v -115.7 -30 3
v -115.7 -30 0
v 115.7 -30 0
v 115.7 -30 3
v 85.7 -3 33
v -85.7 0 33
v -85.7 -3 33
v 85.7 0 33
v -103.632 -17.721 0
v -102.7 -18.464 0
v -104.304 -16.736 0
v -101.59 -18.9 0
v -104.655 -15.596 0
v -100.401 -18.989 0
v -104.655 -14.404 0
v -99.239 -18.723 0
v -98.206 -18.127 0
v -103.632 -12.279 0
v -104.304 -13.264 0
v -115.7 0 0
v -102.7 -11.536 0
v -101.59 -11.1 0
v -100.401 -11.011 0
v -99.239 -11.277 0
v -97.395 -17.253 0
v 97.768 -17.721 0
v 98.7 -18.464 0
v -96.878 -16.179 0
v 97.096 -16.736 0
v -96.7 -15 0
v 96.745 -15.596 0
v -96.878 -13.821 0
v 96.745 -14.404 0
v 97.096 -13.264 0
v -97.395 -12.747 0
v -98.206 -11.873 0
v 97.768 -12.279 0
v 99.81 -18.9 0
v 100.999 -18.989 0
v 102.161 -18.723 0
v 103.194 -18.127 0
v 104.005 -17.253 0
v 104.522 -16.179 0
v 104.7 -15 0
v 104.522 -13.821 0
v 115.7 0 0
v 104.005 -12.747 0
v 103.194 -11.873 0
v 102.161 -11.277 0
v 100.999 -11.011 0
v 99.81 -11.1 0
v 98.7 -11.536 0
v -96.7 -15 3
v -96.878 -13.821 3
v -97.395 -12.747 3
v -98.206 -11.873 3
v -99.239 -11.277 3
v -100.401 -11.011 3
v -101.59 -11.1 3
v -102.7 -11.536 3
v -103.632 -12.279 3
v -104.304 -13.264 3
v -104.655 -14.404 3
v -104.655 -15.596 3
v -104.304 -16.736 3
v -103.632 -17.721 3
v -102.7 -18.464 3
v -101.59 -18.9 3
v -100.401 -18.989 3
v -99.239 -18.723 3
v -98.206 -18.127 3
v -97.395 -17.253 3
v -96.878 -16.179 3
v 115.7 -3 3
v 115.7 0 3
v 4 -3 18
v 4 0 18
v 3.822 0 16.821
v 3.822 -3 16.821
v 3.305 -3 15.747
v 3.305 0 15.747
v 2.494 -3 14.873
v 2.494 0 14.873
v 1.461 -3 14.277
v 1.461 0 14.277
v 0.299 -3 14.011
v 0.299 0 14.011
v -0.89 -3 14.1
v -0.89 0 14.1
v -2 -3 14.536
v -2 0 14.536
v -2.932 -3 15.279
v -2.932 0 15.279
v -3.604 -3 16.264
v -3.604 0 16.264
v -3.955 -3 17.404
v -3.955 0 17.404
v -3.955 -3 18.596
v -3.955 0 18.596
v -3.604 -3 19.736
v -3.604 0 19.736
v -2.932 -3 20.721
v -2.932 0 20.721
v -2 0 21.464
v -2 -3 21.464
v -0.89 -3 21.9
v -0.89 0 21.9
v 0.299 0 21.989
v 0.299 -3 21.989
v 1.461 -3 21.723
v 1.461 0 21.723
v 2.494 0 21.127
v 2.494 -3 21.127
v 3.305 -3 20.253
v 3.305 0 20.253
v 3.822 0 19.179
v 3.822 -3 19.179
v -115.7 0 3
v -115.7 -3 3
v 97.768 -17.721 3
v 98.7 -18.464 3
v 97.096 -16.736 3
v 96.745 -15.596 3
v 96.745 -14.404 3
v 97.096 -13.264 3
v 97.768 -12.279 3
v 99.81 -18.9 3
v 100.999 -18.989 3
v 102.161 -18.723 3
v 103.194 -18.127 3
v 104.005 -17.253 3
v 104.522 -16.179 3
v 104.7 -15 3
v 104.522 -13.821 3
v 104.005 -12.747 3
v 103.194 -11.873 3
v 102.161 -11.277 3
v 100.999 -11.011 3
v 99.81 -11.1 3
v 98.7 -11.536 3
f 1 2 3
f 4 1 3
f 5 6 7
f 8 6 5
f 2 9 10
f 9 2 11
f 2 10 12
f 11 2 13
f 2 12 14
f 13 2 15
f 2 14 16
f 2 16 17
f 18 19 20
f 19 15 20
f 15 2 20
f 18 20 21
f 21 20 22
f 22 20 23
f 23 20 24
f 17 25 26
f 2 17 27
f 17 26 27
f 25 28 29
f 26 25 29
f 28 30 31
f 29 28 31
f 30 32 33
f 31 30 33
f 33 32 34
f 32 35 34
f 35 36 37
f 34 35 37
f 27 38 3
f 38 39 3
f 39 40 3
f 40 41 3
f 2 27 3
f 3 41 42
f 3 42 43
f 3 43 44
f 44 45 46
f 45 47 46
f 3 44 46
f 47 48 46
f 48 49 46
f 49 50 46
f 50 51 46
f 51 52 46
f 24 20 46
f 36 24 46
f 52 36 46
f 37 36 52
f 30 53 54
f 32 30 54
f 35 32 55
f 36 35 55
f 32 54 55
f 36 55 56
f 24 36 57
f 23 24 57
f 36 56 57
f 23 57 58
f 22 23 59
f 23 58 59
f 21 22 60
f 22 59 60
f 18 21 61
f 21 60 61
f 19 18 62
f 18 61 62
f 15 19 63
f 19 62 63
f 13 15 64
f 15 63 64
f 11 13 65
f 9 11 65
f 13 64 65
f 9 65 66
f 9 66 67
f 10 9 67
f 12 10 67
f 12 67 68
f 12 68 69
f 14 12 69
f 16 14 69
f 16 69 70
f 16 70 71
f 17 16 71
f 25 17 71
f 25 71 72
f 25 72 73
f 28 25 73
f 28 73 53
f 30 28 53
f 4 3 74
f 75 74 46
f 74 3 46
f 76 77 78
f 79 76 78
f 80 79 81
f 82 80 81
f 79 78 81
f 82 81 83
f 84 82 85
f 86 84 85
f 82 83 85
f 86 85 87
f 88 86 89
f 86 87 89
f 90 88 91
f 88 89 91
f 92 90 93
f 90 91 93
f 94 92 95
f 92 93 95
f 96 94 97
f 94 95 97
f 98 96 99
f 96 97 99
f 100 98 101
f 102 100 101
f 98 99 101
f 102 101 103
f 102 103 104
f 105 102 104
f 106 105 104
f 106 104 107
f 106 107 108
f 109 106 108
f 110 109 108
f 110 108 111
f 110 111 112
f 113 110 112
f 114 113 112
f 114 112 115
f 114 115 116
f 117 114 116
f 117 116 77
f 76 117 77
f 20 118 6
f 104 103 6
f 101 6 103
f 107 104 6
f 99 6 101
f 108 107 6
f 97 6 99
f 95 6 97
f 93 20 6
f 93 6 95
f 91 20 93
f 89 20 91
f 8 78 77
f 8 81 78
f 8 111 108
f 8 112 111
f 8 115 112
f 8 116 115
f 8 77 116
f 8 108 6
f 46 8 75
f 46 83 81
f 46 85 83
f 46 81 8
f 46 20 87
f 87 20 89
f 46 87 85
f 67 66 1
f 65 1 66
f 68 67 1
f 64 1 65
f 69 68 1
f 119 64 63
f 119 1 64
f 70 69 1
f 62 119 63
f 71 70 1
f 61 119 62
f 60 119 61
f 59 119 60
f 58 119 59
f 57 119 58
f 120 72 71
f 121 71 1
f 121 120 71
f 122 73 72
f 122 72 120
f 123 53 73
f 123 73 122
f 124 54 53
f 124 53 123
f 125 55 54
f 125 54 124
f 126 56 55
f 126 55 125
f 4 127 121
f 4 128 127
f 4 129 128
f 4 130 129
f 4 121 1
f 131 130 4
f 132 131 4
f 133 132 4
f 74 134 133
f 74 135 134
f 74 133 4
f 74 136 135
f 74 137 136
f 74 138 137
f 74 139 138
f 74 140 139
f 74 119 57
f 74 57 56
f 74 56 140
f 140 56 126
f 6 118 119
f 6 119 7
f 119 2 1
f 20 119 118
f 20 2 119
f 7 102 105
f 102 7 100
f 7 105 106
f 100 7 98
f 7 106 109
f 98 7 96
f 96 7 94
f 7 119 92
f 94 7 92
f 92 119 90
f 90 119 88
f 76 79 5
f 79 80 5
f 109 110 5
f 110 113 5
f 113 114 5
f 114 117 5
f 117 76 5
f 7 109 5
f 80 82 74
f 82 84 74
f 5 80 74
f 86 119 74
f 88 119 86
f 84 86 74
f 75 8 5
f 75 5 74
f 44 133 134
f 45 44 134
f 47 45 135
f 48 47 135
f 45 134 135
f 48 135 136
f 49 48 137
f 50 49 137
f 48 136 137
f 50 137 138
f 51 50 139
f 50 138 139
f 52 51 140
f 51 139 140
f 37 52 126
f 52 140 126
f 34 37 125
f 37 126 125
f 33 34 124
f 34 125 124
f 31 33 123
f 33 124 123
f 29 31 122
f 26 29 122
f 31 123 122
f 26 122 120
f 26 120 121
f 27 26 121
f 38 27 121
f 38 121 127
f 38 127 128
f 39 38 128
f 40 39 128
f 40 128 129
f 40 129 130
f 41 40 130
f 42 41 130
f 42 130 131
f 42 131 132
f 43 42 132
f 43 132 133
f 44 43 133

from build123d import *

# Parameters (mm, degrees)
SKETCH1_W                = 231.4
SKETCH1_H                = 30
BOSS_EXTRUDE1_DEPTH      = 3
BOSS_EXTRUDE2_DEPTH      = 3
F_8_0_8_DIAMETER_HOLE2_D = 8
F_8_0_8_DIAMETER_HOLE1_D = 8


with BuildPart() as part:
    # Sketch1 → Boss-Extrude1 (new body)
    with BuildSketch(Plane.XY):
        with Locations((0, -15)):
            Rectangle(SKETCH1_W, SKETCH1_H)
    extrude(amount=BOSS_EXTRUDE1_DEPTH)

    # Sketch3 → Boss-Extrude2 (add)
    with BuildSketch(Plane(origin=(0, 0, 0), x_dir=(1, 0, 0), z_dir=(0, 1, 0))):
        Polygon((-85.7, -33), (85.7, -33), (115.7, -3), (-115.7, -3), align=None)
    extrude(amount=-BOSS_EXTRUDE2_DEPTH)

    # Ø8.0 (8) Diameter Hole2 (through all)
    with Locations(Plane(origin=(0, 0, 0), x_dir=(-1, 0, 0), z_dir=(0, 0, -1))):
        with Locations((100.7, -15), (-100.7, -15)):
            Hole(F_8_0_8_DIAMETER_HOLE2_D / 2)

    # Ø8.0 (8) Diameter Hole1 (through all)
    with Locations(Plane(origin=(0, -3, 0), x_dir=(-1, 0, 0), z_dir=(0, -1, 0))):
        with Locations((0, -18)):
            Hole(F_8_0_8_DIAMETER_HOLE1_D / 2)


solid = part.part
